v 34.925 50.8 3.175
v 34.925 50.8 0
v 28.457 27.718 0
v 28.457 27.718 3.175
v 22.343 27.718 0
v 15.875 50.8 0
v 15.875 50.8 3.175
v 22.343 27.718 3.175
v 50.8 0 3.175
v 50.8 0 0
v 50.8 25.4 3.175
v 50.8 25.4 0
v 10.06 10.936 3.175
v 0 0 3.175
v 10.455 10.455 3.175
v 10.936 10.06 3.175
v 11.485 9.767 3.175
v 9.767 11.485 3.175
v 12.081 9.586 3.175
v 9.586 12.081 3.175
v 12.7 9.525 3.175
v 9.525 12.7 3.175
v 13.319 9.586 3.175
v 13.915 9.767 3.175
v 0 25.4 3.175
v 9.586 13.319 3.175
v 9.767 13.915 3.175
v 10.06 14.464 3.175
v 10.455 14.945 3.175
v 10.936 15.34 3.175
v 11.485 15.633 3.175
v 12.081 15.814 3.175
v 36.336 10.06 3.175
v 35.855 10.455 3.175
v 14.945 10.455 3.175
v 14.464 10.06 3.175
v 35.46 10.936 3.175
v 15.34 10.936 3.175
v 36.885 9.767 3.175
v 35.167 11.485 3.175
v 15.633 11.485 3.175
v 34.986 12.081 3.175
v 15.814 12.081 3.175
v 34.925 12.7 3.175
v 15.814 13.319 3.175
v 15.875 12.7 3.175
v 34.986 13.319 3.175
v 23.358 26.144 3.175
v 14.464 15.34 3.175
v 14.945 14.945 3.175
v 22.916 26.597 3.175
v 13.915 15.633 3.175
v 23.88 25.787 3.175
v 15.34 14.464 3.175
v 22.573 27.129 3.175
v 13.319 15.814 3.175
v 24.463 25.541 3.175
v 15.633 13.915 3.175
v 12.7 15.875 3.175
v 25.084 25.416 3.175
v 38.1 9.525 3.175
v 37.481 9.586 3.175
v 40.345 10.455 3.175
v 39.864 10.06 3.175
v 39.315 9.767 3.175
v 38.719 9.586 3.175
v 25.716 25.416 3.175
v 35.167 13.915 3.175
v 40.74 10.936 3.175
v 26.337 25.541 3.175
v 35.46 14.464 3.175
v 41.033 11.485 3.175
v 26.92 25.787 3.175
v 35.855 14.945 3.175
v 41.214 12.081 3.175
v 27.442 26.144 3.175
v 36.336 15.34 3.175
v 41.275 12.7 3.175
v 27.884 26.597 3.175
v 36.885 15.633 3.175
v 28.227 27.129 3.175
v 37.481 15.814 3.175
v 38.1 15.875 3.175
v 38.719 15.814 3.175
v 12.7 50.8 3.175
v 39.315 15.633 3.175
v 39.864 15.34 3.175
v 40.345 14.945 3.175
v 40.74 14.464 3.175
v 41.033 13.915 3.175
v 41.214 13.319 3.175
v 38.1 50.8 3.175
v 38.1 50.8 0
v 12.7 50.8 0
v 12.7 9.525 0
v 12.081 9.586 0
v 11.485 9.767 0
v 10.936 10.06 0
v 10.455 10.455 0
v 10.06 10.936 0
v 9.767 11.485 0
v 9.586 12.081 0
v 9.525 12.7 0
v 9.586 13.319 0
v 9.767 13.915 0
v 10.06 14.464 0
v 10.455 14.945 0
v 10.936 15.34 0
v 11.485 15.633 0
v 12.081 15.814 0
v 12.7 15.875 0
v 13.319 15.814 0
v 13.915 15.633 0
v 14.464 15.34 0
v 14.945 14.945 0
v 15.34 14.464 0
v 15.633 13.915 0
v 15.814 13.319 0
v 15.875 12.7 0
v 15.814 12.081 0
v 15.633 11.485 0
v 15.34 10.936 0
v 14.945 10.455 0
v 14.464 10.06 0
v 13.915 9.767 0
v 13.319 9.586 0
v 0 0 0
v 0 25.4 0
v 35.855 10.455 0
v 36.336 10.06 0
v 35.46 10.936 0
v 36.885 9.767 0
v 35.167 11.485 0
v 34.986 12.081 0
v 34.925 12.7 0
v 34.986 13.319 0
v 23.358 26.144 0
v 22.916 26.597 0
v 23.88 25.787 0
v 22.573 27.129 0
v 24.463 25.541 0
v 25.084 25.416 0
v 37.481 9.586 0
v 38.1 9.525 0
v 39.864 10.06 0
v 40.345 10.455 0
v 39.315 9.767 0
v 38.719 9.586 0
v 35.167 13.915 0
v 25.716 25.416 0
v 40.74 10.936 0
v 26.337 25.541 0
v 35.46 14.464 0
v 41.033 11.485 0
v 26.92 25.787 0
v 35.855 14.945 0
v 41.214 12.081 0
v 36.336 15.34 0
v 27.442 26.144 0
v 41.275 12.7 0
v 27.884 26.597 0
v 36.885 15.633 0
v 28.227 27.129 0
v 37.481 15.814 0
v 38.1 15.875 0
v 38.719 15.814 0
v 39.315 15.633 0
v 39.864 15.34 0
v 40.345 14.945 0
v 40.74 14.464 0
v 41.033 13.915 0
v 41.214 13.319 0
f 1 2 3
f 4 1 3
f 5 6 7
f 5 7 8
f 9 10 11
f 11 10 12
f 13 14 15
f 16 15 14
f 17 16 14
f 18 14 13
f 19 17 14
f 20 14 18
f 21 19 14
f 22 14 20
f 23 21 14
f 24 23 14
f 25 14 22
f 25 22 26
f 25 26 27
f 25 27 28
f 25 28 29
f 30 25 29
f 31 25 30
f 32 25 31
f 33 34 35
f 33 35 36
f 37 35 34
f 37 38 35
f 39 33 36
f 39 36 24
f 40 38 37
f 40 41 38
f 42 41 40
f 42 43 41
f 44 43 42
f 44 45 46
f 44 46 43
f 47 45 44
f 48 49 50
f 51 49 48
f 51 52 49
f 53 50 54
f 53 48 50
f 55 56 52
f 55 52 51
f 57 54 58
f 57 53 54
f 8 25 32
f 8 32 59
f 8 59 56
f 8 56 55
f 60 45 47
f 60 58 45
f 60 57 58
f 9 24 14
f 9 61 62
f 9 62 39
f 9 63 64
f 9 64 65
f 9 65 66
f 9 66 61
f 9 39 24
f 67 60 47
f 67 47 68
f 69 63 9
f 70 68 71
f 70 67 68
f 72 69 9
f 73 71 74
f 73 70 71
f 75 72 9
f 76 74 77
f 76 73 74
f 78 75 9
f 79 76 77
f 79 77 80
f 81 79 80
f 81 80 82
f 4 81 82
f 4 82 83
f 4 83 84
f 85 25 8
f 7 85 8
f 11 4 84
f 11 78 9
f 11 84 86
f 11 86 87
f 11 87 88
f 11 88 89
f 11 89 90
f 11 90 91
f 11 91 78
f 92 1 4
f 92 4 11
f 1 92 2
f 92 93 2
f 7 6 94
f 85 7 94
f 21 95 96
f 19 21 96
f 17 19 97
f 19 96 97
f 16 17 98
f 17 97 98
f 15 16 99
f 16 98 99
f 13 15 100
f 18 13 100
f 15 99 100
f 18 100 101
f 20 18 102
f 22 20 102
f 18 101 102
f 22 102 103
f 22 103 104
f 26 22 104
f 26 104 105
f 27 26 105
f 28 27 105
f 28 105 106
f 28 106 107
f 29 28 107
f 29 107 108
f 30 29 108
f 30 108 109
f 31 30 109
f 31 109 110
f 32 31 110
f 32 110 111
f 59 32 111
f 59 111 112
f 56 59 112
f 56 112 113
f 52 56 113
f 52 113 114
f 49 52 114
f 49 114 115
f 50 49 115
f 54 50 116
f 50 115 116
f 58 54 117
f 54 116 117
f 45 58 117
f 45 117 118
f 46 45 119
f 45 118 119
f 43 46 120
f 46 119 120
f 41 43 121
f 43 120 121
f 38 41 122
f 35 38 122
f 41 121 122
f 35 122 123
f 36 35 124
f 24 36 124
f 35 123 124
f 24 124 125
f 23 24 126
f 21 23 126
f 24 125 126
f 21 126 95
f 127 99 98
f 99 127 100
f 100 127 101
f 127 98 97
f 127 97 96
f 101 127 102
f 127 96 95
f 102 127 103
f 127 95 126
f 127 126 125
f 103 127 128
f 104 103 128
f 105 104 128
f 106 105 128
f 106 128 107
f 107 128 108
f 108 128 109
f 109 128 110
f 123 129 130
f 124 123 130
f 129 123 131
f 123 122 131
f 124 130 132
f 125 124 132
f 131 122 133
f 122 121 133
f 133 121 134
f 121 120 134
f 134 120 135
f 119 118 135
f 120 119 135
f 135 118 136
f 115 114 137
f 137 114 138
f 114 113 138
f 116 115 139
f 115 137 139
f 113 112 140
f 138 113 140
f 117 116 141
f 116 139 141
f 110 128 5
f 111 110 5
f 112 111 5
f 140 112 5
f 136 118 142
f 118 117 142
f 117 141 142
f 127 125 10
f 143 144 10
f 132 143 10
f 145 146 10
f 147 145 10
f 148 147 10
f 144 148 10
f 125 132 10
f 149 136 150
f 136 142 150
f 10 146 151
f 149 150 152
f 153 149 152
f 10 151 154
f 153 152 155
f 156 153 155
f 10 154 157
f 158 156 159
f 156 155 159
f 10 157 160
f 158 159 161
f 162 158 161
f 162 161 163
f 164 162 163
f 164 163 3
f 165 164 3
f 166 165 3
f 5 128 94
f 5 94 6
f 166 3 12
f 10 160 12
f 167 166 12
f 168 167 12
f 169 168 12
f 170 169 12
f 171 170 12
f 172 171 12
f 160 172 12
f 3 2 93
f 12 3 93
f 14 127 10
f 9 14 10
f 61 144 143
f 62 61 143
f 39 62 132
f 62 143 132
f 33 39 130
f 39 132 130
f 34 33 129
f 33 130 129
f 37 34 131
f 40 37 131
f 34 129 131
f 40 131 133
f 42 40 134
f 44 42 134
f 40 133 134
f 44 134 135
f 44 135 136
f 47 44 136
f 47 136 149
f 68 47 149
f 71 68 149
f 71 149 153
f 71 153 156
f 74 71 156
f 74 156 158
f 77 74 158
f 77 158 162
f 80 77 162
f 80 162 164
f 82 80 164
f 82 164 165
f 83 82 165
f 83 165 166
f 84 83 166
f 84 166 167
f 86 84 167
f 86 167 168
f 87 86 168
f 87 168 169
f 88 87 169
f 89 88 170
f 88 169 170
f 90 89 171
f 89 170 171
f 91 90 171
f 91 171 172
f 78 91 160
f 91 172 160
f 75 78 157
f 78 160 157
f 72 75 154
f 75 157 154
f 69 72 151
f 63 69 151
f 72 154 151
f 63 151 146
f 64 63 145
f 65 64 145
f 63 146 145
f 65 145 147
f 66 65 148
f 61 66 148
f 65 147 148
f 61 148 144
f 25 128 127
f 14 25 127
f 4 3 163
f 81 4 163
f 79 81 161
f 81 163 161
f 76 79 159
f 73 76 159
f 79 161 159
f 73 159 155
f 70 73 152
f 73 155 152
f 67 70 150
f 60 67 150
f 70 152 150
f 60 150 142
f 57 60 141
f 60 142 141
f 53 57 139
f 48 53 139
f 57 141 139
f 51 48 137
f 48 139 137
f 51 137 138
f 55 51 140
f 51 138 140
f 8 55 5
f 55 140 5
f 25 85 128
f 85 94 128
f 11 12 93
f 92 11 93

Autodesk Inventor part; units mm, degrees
ref_plane "YZ Plane" through (0, 0, 0) normal (1, 0, 0) x (0, 1, 0)
ref_plane "XZ Plane" through (0, 0, 0) normal (0, 1, 0) x (-1, 0, 0)
ref_plane "XY Plane" through (0, 0, 0) normal (0, 0, 1) x (1, 0, 0)
sketch "Sketch1" plane through (0, 0, 0) normal (0, 0, 1) x (1, 0, 0)
  line L0 (0, 0) -> (50.8, 0)
  line L1 (50.8, 0) -> (50.8, 50.8)
  line L2 (50.8, 50.8) -> (0, 50.8)
  line L3 (0, 50.8) -> (0, 0)
  dimension "d0" = 50.8
  dimension "d1" = 50.8
extrude "Extrusion1" add sketch "Sketch1" along normal blind 3.175
sketch "Sketch2" plane through (0, 0, 3.175) normal (0, 0, 1) x (1, 0, 0)
  line L0 (0, 0) -> (50.8, 0) projected
  line L1 (50.8, 0) -> (50.8, 50.8) projected
  line L2 (50.8, 50.8) -> (0, 50.8) projected
  line L3 (0, 50.8) -> (0, 0) projected
  point P0 (12.7, 12.7)
  point P1 (38.1, 12.7)
  dimension "d4" = 12.7
  dimension "d5" = 12.7
  dimension "d6" = 12.7
  dimension "d7" = 12.7
hole "Hole1" at (12.7, 12.7, 3.175) at (38.1, 12.7, 3.175) direction (0, 0, -1) diameter 6.35 end through all
sketch "Sketch3" plane through (0, 0, 0) normal (0, 0, -1) x (-1, 0, 0)
  line L0 (0, 0) -> (-50.8, 0) projected
  line L1 (-50.8, 0) -> (-50.8, 50.8) projected
  line L2 (-50.8, 0) -> (-50.8, 50.8) projected
  line L3 (-50.8, 25.4) -> (-38.1, 50.8)
  line L4 (-50.8, 50.8) -> (0, 50.8) construction
  line L5 (-38.1, 50.8) -> (-12.7, 50.8) construction
  line L6 (-12.7, 50.8) -> (0, 25.4)
  line L7 (0, 50.8) -> (0, 0) projected
  line L8 (-38.1, 50.8) -> (-50.8, 50.8)
  line L9 (-50.8, 50.8) -> (-50.8, 25.4)
  line L10 (-12.7, 50.8) -> (0, 50.8)
  line L11 (0, 50.8) -> (0, 25.4)
  dimension "d19" = 25.4
  dimension "d20" = 25.4
  dimension "d21" = 25.4
  dimension "d22" = 12.7
extrude "Extrusion2" cut sketch "Sketch3" against normal blind 25.4
sketch "Sketch4" plane through (0, 0, 0) normal (0, 0, -1) x (-1, 0, 0)
  line L0 (0, 25.4) -> (-12.7, 50.8) projected
  line L1 (-38.1, 50.8) -> (-12.7, 50.8) projected
  line L2 (-38.1, 50.8) -> (-50.8, 25.4) projected
  line L3 (-50.8, 0) -> (-50.8, 25.4) projected
  line L4 (0, 0) -> (-50.8, 0) projected
  line L5 (0, 25.4) -> (0, 0) projected
  circle A0 centre (-12.7, 12.7) radius 3.175 projected
  circle A1 centre (-38.1, 12.7) radius 3.175 projected
  circle A2 centre (-25.4, 28.575) radius 3.175 construction
  line L6 (-34.925, 50.8) -> (-28.4572, 27.7183)
  line L7 (-15.875, 50.8) -> (-22.3428, 27.7183)
  arc A3 (-28.4572, 27.7183) -> (-22.3428, 27.7183) centre (-25.4, 28.575) ccw
  line L8 (-34.925, 50.8) -> (-15.875, 50.8)
  line L9 (-38.1, 50.8) -> (-12.7, 50.8) projected
  dimension "d25" = 6.35
  dimension "d26" = 22.225
  dimension "d27" = 12.7
  dimension "d28" = 3.175
  dimension "d29" = 3.175
extrude "Extrusion3" cut sketch "Sketch4" against normal blind 25.4 contours L7 A3 L6 L1
properties part number "pickup arm tab" material "Aluminum 6061"
